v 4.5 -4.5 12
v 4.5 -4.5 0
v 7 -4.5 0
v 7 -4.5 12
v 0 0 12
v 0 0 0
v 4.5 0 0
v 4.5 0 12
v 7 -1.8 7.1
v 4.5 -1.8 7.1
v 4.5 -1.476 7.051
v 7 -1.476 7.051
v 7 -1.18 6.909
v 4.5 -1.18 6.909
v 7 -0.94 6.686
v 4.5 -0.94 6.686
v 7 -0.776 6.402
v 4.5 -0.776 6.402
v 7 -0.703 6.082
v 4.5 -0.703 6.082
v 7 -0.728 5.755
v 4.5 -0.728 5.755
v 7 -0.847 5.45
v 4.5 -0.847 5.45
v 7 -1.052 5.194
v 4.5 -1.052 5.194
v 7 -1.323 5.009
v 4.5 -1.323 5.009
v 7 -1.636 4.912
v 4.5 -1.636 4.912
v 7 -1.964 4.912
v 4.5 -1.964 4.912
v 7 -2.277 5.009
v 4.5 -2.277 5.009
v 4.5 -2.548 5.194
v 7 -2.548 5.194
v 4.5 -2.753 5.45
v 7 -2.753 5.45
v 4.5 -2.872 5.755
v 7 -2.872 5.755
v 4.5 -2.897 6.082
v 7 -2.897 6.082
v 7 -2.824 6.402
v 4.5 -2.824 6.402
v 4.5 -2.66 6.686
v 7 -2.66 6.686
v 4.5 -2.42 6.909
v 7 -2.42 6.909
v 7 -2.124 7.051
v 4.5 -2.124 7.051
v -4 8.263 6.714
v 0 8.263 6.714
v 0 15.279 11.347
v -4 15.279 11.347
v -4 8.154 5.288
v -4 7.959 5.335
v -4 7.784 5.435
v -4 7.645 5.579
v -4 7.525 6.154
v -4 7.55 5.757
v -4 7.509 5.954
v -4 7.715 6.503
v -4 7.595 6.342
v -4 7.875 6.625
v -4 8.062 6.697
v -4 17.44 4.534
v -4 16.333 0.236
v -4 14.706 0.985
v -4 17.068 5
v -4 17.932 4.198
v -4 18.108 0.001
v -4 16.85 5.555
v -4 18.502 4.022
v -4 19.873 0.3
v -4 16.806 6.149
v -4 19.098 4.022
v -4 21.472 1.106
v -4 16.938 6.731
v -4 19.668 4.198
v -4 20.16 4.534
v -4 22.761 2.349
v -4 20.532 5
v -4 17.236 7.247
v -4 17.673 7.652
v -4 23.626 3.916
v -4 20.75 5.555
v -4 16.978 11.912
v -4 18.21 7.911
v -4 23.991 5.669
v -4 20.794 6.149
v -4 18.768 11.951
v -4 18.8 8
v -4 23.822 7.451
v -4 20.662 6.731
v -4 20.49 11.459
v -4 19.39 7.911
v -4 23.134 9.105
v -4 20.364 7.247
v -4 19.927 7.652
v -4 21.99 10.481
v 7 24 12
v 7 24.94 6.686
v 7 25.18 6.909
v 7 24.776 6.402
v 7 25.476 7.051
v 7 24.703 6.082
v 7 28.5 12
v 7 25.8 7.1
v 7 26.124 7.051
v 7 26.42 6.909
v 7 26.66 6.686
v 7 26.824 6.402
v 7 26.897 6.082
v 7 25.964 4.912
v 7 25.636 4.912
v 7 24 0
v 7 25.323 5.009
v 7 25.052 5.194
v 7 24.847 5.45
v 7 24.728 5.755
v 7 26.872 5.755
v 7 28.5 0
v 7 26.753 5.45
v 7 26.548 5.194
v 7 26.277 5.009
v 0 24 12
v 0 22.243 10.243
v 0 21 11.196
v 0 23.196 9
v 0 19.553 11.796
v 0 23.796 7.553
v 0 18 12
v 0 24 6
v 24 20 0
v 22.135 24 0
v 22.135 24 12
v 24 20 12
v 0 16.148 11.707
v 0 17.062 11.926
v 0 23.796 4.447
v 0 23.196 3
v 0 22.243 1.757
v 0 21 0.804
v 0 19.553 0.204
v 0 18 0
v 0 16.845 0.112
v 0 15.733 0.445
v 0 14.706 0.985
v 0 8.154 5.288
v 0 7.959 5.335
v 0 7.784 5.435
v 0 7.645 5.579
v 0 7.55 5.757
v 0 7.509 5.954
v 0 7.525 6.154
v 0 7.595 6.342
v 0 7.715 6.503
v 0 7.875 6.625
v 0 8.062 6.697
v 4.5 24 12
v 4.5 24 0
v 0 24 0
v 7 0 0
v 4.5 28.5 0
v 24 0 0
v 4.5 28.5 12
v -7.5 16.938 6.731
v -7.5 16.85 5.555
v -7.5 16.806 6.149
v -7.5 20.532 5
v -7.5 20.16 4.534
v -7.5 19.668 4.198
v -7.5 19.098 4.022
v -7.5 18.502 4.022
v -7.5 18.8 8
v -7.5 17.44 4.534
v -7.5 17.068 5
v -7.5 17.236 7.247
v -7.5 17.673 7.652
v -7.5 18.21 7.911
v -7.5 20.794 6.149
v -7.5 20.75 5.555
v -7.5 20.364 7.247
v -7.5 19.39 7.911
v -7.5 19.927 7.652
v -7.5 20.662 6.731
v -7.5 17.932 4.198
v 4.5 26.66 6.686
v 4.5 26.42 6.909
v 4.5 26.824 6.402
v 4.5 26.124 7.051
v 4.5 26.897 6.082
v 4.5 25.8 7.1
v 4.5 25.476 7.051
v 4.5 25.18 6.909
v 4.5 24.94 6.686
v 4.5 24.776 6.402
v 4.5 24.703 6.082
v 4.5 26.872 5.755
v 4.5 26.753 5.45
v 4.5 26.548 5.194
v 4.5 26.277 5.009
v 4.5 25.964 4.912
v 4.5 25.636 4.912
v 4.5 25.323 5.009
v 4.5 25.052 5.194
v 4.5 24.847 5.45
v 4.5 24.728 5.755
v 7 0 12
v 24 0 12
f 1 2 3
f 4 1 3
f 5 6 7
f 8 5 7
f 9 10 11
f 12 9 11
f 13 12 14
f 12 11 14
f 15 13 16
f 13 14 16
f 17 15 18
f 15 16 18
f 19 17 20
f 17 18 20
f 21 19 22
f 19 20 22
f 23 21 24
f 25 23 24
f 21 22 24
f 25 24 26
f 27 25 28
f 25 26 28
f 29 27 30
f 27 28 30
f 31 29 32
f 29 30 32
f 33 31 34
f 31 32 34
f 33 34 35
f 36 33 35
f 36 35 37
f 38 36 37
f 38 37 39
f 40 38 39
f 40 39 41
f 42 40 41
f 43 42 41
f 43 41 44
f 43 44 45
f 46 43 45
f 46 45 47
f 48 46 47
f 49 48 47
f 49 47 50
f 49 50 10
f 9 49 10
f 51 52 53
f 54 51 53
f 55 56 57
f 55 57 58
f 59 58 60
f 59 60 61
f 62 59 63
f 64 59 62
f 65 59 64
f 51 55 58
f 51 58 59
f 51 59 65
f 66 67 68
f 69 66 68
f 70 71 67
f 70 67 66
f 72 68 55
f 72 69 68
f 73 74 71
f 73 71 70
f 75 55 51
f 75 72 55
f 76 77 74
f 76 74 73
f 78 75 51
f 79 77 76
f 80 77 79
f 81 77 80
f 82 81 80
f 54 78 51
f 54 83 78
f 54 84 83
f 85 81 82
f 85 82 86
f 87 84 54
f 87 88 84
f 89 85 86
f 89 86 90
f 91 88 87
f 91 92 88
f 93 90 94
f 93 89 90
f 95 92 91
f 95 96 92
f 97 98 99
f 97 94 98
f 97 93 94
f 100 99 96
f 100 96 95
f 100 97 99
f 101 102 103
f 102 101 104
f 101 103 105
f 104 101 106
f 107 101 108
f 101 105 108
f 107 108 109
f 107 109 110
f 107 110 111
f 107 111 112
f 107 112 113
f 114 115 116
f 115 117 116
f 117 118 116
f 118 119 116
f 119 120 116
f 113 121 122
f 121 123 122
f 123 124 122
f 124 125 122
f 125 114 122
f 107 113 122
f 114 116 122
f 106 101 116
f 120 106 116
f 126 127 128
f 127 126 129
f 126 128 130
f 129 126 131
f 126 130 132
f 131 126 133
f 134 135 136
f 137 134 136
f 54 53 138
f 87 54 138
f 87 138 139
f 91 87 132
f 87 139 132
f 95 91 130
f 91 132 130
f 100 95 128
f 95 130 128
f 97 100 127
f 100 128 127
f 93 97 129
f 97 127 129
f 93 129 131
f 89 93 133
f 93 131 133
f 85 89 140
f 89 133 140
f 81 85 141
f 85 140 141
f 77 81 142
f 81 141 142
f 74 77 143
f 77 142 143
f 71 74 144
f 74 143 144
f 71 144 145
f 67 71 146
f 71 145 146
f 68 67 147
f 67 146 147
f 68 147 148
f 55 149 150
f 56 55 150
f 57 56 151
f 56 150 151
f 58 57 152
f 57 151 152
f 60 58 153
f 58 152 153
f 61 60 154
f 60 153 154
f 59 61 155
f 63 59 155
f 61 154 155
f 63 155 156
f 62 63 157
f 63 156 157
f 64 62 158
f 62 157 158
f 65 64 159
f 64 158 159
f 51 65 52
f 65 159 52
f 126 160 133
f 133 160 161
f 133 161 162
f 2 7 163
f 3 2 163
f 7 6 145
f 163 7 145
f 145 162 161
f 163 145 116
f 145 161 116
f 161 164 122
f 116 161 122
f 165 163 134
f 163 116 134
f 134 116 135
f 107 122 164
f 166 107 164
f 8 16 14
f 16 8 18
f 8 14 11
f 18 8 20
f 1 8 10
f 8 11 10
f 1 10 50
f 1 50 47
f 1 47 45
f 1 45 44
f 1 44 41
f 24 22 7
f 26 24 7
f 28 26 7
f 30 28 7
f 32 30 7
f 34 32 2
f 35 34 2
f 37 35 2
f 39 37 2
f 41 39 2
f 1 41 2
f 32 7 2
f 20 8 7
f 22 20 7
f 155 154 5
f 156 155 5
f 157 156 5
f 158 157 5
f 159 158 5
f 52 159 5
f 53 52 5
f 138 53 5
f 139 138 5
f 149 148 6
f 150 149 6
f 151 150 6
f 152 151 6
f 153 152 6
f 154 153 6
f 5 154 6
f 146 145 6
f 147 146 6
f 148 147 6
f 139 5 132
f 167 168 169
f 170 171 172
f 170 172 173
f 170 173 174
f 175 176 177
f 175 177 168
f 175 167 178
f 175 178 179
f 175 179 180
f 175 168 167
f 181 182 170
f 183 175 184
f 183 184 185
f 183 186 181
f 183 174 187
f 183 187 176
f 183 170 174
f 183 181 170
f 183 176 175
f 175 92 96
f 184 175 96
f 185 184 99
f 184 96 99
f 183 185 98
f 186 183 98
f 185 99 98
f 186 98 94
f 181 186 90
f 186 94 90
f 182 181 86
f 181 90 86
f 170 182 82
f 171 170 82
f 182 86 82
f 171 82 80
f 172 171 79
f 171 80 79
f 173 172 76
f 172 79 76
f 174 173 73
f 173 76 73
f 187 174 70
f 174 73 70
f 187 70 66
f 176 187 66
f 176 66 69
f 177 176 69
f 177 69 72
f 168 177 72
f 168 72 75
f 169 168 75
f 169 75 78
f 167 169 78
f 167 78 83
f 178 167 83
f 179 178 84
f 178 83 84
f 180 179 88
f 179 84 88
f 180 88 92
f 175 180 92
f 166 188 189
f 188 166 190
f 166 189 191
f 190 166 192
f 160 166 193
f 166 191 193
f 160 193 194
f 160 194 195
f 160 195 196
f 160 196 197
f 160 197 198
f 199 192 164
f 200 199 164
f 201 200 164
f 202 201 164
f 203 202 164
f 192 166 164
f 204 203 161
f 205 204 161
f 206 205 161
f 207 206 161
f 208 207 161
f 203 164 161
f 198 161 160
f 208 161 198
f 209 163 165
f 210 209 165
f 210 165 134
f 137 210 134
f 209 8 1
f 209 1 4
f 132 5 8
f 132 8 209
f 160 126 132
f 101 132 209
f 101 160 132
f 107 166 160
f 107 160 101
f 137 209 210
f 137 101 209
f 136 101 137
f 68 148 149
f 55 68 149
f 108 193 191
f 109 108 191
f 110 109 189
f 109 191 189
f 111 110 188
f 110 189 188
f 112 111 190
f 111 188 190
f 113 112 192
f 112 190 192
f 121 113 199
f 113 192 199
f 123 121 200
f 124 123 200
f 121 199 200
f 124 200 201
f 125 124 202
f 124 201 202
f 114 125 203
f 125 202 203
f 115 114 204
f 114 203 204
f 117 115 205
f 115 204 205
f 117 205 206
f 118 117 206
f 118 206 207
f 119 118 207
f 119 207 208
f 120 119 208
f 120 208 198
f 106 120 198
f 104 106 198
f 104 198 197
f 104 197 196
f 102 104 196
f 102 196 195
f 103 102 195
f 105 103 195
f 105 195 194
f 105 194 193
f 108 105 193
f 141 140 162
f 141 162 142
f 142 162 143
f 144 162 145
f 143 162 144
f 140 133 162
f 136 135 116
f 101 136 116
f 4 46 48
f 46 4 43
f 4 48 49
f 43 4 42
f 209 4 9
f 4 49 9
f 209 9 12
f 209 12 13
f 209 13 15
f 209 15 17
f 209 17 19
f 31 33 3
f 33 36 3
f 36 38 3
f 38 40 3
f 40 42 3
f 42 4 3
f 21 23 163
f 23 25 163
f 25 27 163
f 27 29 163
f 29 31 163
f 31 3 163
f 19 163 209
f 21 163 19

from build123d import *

# Parameters (mm, degrees)
EXTRUDE_1_DEPTH     = 12
SKETCH_3_R          = 1.1
CUT_EXTRUDE_1_DEPTH = 37.558172821
EXTRUDE_2_DEPTH     = 4
SKETCH_11_R         = 2
EXTRUDE_4_DEPTH     = 3.5
CHAMFER_1_SIZE      = 4
CHAMFER_1_SIZE2     = 1.865230633


with BuildPart() as part:
    # 草图1 → 凸台-拉伸1 (new body)
    with BuildSketch(Plane.XY):
        Polygon((7, 24), (7, 28.5), (4.5, 28.5), (4.5, 24), (0, 24), (0, 0), (4.5, 0), (4.5, -4.5), (7, -4.5), (7, 0), (24, 0), (24, 24), align=None)
    extrude(amount=EXTRUDE_1_DEPTH)

    # 草图3 → 切除-拉伸1 (cut, through all)
    with BuildSketch(Plane.ZY.offset(-4.5)):
        with Locations((6, 25.8)):
            Circle(SKETCH_3_R)
        with Locations((6, -1.8)):
            Circle(SKETCH_3_R)
    extrude(amount=-CUT_EXTRUDE_1_DEPTH, mode=Mode.SUBTRACT)

    # 草图10 → 凸台-拉伸2 (add)
    with BuildSketch(Plane.ZY):
        with BuildLine():
            Line((0.984839492, 14.706344723), (5.288002877, 8.154033308))
            ThreePointArc((5.288002877, 8.154033308), (6.054332561, 7.509929186), (6.714260792, 8.262674849))
            Line((6.714260792, 8.262674849), (11.347469324, 15.278865708))
            ThreePointArc((11.347469324, 15.278865708), (5.669013056, 23.990863681), (0.984839492, 14.706344723))
        make_face()
    extrude(amount=EXTRUDE_2_DEPTH)

    # 草图11 → 凸台-拉伸4 (add)
    with BuildSketch(Plane.ZY.offset(4)):
        with Locations((6, 18.8)):
            Circle(SKETCH_11_R)
    extrude(amount=EXTRUDE_4_DEPTH)

    # 倒角1
    chamfer_1_edges = [part.edges().sort_by_distance(p)[0] for p in [
        (24, 24, 6),
    ]]
    chamfer_1_side = [part.faces().sort_by_distance(p)[0] for p in [
        (24, 12, 6),
    ]]
    chamfer(chamfer_1_edges, length=CHAMFER_1_SIZE, length2=CHAMFER_1_SIZE2, reference=chamfer_1_side[0])


solid = part.part
